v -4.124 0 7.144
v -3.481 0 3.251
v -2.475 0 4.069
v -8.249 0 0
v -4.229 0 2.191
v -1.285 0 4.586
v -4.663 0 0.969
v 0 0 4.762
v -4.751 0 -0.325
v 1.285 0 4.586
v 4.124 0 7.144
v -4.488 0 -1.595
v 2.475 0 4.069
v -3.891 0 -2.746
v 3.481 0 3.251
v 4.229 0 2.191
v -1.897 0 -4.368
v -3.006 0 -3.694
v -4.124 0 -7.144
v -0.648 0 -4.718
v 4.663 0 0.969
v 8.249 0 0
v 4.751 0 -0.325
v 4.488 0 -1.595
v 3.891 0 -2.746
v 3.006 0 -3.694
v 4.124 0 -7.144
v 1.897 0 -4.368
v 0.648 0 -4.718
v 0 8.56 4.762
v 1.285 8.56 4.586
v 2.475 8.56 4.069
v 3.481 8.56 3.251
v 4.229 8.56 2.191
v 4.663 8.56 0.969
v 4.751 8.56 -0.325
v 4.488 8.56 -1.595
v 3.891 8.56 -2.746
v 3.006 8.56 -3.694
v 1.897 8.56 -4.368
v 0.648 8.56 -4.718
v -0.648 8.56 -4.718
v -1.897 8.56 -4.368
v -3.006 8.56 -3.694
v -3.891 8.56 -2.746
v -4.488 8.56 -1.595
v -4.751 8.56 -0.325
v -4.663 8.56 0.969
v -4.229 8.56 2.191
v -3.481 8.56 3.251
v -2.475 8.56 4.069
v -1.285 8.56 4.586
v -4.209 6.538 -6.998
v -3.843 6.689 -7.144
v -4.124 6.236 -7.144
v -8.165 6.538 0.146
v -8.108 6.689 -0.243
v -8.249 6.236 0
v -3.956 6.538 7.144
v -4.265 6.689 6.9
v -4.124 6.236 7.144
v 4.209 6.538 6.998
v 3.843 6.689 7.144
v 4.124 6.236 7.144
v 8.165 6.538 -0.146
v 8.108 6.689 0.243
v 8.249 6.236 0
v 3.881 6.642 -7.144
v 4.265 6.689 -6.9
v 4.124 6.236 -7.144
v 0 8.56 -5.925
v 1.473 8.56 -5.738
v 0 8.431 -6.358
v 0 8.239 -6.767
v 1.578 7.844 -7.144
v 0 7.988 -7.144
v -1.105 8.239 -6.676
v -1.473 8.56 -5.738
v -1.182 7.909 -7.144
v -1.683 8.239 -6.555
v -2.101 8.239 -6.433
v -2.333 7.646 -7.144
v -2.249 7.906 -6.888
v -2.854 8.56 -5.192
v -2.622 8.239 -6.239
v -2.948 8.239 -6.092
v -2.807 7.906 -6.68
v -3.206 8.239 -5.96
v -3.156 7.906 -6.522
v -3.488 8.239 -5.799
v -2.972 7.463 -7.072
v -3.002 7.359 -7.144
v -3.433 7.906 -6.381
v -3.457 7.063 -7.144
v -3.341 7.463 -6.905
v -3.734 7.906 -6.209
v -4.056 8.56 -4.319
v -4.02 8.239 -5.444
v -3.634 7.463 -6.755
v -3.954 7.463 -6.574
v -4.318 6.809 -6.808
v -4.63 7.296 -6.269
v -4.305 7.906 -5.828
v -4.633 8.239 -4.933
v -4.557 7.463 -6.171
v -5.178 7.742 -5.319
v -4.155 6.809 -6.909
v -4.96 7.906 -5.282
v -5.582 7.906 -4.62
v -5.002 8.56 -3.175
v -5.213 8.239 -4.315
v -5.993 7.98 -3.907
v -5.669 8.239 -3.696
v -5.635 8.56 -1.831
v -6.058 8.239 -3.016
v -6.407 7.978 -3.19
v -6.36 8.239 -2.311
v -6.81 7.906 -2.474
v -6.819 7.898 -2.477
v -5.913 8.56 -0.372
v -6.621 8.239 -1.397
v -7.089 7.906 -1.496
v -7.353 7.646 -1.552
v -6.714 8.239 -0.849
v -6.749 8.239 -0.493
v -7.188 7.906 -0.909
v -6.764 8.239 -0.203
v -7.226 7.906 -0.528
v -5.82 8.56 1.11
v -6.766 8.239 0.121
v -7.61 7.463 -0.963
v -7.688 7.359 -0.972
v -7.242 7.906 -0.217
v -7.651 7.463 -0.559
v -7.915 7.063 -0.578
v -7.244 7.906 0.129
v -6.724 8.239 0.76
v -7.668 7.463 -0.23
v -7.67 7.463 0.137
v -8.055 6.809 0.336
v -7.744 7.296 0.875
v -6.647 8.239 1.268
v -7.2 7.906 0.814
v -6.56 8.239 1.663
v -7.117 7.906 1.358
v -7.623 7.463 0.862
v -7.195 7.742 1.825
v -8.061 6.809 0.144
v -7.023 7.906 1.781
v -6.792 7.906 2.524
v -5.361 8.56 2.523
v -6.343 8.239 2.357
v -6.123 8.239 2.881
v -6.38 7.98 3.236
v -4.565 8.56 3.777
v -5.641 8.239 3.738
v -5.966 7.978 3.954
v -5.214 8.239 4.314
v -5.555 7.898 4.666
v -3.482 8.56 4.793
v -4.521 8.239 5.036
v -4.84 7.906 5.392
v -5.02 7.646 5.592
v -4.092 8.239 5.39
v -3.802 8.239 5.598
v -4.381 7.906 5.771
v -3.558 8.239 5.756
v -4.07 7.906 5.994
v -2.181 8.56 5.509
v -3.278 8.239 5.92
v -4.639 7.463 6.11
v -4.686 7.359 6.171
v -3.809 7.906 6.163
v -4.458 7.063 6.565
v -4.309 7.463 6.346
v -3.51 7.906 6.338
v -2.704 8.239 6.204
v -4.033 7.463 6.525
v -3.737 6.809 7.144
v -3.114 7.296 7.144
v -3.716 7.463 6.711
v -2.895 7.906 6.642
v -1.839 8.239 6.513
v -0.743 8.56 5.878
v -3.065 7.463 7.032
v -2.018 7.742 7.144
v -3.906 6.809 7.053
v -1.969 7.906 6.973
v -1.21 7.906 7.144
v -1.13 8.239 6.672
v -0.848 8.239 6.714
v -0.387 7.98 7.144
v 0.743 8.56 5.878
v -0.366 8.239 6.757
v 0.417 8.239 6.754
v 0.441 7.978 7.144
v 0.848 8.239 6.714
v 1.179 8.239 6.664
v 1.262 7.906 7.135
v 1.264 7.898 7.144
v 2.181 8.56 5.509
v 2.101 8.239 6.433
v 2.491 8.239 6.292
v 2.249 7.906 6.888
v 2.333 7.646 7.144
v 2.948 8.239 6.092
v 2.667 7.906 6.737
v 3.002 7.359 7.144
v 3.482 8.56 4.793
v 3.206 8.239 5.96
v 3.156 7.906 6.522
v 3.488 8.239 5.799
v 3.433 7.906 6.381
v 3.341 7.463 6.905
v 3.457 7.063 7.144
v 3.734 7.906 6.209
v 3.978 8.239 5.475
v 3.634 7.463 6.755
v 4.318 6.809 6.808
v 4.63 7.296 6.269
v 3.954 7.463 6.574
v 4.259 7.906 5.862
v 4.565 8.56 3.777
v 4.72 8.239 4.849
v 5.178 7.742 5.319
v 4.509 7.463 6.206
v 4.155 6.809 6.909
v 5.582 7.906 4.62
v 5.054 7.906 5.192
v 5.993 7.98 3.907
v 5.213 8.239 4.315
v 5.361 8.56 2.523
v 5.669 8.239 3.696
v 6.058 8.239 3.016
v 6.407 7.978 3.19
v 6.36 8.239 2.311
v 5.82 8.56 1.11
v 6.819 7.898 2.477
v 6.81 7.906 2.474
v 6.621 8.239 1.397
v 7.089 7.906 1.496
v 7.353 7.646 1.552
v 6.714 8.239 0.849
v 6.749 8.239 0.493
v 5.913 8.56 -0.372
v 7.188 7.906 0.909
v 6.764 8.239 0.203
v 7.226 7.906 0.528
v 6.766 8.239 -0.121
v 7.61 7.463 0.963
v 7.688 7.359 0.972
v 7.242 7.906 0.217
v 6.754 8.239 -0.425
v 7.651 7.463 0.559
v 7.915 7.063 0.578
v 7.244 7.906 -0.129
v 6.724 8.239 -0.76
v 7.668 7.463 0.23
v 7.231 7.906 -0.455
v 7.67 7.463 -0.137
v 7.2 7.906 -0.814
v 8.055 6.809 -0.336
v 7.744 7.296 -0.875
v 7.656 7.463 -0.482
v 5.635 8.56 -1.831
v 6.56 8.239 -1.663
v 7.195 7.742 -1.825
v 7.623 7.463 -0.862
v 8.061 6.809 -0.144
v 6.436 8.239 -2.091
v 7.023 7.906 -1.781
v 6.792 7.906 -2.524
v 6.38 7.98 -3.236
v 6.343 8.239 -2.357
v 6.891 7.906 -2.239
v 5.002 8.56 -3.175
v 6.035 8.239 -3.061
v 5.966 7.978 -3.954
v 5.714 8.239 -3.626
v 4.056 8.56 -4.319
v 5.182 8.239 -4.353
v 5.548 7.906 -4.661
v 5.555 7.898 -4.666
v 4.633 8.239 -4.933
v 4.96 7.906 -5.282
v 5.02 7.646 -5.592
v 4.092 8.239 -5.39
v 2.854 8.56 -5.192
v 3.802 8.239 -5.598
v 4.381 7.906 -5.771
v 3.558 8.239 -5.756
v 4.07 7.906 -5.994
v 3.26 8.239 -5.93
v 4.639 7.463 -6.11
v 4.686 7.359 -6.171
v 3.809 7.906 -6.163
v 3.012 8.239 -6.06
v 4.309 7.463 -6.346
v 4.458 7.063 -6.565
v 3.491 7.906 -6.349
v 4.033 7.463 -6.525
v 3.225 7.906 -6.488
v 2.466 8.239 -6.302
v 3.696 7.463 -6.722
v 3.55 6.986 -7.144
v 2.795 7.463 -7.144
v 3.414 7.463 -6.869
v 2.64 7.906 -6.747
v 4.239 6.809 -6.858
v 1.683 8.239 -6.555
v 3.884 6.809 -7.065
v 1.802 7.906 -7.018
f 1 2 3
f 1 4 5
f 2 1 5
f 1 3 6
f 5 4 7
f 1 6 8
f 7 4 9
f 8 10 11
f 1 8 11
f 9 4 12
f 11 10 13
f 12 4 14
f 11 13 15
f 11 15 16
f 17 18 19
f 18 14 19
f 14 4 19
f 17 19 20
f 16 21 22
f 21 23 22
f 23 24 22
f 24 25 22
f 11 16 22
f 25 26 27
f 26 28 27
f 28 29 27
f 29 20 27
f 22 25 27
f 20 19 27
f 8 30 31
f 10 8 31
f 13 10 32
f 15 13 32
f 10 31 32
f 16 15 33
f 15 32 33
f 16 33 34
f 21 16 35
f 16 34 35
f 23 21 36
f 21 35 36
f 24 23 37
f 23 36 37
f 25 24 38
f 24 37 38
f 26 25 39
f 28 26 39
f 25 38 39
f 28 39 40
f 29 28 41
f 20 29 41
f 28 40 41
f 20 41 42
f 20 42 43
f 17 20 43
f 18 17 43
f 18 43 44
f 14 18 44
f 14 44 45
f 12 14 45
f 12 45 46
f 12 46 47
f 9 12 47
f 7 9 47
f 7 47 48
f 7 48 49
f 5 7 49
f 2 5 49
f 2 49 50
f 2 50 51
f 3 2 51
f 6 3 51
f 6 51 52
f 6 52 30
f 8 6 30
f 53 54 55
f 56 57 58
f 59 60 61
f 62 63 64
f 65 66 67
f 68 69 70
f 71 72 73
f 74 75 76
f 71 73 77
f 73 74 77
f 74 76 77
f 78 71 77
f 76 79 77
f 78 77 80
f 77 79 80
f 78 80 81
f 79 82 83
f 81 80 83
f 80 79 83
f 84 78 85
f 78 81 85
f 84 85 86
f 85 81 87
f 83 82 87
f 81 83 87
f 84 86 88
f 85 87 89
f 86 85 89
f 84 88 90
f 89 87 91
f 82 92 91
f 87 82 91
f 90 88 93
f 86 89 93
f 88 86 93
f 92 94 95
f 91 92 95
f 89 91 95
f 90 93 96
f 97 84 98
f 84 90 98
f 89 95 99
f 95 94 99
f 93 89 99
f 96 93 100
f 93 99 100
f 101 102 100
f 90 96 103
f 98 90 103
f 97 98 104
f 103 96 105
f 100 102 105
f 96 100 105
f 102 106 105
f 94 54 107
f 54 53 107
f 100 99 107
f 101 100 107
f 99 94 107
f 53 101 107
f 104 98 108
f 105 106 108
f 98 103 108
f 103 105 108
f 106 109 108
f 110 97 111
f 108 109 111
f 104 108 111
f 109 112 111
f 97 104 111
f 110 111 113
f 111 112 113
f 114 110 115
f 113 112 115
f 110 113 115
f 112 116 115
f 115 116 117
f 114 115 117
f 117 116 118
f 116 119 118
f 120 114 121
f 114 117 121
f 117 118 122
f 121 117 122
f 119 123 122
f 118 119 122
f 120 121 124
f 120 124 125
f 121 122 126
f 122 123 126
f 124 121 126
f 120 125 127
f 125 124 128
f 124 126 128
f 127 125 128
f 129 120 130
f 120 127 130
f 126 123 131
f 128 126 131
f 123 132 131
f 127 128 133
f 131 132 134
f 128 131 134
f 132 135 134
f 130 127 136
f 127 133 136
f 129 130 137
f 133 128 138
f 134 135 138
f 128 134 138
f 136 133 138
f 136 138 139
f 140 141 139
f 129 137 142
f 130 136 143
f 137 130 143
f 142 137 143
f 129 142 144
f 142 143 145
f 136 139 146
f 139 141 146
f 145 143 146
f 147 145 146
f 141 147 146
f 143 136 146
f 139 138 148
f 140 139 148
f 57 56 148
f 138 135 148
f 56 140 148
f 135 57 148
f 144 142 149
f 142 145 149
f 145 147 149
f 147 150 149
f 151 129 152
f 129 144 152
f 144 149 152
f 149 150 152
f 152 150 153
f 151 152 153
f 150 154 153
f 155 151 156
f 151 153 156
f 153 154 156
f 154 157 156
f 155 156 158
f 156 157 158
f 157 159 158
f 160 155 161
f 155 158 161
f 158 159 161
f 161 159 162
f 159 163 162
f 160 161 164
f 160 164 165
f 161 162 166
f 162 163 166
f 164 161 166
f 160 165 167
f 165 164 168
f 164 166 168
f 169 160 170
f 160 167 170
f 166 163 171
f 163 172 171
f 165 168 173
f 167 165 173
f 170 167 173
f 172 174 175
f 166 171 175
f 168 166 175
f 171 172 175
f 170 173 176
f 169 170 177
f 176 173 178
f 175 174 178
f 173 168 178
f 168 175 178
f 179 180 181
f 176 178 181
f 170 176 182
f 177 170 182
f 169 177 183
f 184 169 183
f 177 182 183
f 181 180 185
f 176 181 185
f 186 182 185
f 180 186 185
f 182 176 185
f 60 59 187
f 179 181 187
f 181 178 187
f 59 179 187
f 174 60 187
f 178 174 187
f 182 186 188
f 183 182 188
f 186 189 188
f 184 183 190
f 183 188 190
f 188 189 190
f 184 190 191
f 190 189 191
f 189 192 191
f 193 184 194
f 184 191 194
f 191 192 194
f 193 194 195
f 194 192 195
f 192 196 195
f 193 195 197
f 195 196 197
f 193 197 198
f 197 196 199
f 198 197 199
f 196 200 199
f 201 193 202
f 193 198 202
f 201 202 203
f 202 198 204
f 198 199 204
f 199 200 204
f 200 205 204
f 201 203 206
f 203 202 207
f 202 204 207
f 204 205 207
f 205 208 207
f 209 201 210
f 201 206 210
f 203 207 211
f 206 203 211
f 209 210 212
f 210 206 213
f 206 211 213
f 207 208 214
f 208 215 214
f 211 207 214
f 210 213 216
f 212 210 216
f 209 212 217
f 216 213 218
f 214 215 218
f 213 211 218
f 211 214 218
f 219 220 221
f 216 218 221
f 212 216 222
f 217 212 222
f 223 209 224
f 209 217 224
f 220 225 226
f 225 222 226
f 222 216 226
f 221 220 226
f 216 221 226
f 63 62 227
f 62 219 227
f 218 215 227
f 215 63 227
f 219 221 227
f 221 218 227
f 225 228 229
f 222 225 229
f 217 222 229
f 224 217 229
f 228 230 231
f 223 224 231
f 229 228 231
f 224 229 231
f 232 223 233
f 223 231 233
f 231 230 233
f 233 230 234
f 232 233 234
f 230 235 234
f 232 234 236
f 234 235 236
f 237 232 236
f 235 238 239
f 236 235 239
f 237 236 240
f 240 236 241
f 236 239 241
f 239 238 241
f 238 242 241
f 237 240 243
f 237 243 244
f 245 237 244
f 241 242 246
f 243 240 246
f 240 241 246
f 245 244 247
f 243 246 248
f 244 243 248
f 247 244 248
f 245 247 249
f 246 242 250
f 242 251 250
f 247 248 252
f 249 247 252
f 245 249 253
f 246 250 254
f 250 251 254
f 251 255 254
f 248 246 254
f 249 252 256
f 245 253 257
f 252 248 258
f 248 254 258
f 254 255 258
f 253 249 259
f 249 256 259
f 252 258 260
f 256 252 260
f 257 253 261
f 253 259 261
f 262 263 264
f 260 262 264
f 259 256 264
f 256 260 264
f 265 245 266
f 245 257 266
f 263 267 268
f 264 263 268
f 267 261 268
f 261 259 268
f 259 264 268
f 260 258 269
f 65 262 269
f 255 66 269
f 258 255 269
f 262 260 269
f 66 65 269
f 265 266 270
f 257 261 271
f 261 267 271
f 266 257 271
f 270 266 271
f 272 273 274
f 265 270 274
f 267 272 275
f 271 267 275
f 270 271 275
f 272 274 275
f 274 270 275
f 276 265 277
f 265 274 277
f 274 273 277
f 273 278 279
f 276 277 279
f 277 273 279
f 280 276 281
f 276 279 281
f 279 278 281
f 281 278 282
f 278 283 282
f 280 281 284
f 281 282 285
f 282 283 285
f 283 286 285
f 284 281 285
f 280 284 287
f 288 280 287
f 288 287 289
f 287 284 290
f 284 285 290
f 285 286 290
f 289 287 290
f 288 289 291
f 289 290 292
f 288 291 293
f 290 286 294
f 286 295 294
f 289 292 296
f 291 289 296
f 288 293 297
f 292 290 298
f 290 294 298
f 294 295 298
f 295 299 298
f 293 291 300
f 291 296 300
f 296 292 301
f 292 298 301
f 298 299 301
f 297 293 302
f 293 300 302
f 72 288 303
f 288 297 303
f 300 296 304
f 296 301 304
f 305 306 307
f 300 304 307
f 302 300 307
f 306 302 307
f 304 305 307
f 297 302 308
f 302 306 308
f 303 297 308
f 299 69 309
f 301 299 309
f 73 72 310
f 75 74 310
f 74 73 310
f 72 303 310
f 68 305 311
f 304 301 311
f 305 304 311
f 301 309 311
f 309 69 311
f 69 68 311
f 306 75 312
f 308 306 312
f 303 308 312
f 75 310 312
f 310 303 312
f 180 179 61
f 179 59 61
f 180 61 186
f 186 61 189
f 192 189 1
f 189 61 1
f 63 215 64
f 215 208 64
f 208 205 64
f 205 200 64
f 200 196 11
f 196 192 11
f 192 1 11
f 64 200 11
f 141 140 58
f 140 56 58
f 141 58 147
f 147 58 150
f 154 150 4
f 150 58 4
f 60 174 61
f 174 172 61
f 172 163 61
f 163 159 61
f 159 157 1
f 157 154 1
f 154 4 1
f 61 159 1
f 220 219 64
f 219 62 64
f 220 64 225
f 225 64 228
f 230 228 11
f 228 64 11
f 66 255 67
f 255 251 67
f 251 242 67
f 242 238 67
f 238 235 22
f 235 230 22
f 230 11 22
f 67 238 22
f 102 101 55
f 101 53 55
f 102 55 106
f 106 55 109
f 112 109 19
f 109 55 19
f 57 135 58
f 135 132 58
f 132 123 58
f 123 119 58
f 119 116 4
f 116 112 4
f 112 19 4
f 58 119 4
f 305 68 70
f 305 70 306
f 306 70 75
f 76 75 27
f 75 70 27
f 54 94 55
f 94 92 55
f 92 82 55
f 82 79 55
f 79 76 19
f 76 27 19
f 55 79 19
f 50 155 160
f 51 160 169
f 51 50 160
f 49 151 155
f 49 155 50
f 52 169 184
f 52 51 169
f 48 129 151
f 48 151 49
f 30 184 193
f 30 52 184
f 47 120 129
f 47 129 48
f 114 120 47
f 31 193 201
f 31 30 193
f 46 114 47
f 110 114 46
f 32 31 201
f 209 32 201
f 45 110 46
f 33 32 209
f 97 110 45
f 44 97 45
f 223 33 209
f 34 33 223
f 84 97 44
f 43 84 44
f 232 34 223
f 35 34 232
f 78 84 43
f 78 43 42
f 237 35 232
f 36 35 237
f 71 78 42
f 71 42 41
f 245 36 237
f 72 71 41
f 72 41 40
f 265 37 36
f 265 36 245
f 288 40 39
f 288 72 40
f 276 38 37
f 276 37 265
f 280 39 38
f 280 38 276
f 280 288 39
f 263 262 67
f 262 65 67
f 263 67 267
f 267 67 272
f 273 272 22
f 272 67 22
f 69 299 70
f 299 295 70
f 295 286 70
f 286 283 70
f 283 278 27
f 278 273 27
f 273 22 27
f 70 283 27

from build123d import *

# Parameters (mm, degrees)
BOSS_EXTRU_1_DEPTH      = 8.5598
ESQUISSE2_R             = 4.7625
ENL_V_MAT_EXTRU_1_DEPTH = 14.86894224


with BuildPart() as part:
    # Esquisse1 → Boss.-Extru.1 (new body)
    with BuildSketch(Plane(origin=(0, 0, 0), x_dir=(1, 0, 0), z_dir=(0, 1, 0))):
        Polygon((4.124445986, 7.14375), (-4.124445986, 7.14375), (-8.248891971, 0), (-4.124445986, -7.14375), (4.124445986, -7.14375), (8.248891971, 0), align=None)
    extrude(amount=BOSS_EXTRU_1_DEPTH)

    # Esquisse2 → Enlèv. mat.-Extru.1 (cut, through all)
    with BuildSketch(Plane(origin=(0, 8.5598, 0), x_dir=(1, 0, 0), z_dir=(0, 1, 0))):
        with Locations(Location((0, 0, 0), (0, 0, 270))):
            Circle(ESQUISSE2_R)
    extrude(amount=-ENL_V_MAT_EXTRU_1_DEPTH, mode=Mode.SUBTRACT)

    # Esquisse6 → Enlèvement de matière-Révolution1 (revolve, cut)
    with BuildSketch(Plane.XY, mode=Mode.PRIVATE) as enl_vement_de_mati_re_r_volution1_sk:
        with BuildLine():
            Line((-8.248891971, 8.5598), (-7.086761314, 8.5598))
            Line((-7.086761314, 8.5598), (-5.924630657, 8.5598))
            ThreePointArc((-5.924630657, 8.5598), (-7.427141503, 7.738049532), (-8.248891971, 6.235538686))
            Line((-8.248891971, 6.235538686), (-8.248891971, 7.397669343))
            Line((-8.248891971, 7.397669343), (-8.248891971, 8.5598))
        make_face()
    revolve(enl_vement_de_mati_re_r_volution1_sk.sketch.rotate(Axis((0, 0, 0), (0, 1, 0)), 270), axis=Axis((0, 0, 0), (0, 1, 0)), mode=Mode.SUBTRACT)


solid = part.part
